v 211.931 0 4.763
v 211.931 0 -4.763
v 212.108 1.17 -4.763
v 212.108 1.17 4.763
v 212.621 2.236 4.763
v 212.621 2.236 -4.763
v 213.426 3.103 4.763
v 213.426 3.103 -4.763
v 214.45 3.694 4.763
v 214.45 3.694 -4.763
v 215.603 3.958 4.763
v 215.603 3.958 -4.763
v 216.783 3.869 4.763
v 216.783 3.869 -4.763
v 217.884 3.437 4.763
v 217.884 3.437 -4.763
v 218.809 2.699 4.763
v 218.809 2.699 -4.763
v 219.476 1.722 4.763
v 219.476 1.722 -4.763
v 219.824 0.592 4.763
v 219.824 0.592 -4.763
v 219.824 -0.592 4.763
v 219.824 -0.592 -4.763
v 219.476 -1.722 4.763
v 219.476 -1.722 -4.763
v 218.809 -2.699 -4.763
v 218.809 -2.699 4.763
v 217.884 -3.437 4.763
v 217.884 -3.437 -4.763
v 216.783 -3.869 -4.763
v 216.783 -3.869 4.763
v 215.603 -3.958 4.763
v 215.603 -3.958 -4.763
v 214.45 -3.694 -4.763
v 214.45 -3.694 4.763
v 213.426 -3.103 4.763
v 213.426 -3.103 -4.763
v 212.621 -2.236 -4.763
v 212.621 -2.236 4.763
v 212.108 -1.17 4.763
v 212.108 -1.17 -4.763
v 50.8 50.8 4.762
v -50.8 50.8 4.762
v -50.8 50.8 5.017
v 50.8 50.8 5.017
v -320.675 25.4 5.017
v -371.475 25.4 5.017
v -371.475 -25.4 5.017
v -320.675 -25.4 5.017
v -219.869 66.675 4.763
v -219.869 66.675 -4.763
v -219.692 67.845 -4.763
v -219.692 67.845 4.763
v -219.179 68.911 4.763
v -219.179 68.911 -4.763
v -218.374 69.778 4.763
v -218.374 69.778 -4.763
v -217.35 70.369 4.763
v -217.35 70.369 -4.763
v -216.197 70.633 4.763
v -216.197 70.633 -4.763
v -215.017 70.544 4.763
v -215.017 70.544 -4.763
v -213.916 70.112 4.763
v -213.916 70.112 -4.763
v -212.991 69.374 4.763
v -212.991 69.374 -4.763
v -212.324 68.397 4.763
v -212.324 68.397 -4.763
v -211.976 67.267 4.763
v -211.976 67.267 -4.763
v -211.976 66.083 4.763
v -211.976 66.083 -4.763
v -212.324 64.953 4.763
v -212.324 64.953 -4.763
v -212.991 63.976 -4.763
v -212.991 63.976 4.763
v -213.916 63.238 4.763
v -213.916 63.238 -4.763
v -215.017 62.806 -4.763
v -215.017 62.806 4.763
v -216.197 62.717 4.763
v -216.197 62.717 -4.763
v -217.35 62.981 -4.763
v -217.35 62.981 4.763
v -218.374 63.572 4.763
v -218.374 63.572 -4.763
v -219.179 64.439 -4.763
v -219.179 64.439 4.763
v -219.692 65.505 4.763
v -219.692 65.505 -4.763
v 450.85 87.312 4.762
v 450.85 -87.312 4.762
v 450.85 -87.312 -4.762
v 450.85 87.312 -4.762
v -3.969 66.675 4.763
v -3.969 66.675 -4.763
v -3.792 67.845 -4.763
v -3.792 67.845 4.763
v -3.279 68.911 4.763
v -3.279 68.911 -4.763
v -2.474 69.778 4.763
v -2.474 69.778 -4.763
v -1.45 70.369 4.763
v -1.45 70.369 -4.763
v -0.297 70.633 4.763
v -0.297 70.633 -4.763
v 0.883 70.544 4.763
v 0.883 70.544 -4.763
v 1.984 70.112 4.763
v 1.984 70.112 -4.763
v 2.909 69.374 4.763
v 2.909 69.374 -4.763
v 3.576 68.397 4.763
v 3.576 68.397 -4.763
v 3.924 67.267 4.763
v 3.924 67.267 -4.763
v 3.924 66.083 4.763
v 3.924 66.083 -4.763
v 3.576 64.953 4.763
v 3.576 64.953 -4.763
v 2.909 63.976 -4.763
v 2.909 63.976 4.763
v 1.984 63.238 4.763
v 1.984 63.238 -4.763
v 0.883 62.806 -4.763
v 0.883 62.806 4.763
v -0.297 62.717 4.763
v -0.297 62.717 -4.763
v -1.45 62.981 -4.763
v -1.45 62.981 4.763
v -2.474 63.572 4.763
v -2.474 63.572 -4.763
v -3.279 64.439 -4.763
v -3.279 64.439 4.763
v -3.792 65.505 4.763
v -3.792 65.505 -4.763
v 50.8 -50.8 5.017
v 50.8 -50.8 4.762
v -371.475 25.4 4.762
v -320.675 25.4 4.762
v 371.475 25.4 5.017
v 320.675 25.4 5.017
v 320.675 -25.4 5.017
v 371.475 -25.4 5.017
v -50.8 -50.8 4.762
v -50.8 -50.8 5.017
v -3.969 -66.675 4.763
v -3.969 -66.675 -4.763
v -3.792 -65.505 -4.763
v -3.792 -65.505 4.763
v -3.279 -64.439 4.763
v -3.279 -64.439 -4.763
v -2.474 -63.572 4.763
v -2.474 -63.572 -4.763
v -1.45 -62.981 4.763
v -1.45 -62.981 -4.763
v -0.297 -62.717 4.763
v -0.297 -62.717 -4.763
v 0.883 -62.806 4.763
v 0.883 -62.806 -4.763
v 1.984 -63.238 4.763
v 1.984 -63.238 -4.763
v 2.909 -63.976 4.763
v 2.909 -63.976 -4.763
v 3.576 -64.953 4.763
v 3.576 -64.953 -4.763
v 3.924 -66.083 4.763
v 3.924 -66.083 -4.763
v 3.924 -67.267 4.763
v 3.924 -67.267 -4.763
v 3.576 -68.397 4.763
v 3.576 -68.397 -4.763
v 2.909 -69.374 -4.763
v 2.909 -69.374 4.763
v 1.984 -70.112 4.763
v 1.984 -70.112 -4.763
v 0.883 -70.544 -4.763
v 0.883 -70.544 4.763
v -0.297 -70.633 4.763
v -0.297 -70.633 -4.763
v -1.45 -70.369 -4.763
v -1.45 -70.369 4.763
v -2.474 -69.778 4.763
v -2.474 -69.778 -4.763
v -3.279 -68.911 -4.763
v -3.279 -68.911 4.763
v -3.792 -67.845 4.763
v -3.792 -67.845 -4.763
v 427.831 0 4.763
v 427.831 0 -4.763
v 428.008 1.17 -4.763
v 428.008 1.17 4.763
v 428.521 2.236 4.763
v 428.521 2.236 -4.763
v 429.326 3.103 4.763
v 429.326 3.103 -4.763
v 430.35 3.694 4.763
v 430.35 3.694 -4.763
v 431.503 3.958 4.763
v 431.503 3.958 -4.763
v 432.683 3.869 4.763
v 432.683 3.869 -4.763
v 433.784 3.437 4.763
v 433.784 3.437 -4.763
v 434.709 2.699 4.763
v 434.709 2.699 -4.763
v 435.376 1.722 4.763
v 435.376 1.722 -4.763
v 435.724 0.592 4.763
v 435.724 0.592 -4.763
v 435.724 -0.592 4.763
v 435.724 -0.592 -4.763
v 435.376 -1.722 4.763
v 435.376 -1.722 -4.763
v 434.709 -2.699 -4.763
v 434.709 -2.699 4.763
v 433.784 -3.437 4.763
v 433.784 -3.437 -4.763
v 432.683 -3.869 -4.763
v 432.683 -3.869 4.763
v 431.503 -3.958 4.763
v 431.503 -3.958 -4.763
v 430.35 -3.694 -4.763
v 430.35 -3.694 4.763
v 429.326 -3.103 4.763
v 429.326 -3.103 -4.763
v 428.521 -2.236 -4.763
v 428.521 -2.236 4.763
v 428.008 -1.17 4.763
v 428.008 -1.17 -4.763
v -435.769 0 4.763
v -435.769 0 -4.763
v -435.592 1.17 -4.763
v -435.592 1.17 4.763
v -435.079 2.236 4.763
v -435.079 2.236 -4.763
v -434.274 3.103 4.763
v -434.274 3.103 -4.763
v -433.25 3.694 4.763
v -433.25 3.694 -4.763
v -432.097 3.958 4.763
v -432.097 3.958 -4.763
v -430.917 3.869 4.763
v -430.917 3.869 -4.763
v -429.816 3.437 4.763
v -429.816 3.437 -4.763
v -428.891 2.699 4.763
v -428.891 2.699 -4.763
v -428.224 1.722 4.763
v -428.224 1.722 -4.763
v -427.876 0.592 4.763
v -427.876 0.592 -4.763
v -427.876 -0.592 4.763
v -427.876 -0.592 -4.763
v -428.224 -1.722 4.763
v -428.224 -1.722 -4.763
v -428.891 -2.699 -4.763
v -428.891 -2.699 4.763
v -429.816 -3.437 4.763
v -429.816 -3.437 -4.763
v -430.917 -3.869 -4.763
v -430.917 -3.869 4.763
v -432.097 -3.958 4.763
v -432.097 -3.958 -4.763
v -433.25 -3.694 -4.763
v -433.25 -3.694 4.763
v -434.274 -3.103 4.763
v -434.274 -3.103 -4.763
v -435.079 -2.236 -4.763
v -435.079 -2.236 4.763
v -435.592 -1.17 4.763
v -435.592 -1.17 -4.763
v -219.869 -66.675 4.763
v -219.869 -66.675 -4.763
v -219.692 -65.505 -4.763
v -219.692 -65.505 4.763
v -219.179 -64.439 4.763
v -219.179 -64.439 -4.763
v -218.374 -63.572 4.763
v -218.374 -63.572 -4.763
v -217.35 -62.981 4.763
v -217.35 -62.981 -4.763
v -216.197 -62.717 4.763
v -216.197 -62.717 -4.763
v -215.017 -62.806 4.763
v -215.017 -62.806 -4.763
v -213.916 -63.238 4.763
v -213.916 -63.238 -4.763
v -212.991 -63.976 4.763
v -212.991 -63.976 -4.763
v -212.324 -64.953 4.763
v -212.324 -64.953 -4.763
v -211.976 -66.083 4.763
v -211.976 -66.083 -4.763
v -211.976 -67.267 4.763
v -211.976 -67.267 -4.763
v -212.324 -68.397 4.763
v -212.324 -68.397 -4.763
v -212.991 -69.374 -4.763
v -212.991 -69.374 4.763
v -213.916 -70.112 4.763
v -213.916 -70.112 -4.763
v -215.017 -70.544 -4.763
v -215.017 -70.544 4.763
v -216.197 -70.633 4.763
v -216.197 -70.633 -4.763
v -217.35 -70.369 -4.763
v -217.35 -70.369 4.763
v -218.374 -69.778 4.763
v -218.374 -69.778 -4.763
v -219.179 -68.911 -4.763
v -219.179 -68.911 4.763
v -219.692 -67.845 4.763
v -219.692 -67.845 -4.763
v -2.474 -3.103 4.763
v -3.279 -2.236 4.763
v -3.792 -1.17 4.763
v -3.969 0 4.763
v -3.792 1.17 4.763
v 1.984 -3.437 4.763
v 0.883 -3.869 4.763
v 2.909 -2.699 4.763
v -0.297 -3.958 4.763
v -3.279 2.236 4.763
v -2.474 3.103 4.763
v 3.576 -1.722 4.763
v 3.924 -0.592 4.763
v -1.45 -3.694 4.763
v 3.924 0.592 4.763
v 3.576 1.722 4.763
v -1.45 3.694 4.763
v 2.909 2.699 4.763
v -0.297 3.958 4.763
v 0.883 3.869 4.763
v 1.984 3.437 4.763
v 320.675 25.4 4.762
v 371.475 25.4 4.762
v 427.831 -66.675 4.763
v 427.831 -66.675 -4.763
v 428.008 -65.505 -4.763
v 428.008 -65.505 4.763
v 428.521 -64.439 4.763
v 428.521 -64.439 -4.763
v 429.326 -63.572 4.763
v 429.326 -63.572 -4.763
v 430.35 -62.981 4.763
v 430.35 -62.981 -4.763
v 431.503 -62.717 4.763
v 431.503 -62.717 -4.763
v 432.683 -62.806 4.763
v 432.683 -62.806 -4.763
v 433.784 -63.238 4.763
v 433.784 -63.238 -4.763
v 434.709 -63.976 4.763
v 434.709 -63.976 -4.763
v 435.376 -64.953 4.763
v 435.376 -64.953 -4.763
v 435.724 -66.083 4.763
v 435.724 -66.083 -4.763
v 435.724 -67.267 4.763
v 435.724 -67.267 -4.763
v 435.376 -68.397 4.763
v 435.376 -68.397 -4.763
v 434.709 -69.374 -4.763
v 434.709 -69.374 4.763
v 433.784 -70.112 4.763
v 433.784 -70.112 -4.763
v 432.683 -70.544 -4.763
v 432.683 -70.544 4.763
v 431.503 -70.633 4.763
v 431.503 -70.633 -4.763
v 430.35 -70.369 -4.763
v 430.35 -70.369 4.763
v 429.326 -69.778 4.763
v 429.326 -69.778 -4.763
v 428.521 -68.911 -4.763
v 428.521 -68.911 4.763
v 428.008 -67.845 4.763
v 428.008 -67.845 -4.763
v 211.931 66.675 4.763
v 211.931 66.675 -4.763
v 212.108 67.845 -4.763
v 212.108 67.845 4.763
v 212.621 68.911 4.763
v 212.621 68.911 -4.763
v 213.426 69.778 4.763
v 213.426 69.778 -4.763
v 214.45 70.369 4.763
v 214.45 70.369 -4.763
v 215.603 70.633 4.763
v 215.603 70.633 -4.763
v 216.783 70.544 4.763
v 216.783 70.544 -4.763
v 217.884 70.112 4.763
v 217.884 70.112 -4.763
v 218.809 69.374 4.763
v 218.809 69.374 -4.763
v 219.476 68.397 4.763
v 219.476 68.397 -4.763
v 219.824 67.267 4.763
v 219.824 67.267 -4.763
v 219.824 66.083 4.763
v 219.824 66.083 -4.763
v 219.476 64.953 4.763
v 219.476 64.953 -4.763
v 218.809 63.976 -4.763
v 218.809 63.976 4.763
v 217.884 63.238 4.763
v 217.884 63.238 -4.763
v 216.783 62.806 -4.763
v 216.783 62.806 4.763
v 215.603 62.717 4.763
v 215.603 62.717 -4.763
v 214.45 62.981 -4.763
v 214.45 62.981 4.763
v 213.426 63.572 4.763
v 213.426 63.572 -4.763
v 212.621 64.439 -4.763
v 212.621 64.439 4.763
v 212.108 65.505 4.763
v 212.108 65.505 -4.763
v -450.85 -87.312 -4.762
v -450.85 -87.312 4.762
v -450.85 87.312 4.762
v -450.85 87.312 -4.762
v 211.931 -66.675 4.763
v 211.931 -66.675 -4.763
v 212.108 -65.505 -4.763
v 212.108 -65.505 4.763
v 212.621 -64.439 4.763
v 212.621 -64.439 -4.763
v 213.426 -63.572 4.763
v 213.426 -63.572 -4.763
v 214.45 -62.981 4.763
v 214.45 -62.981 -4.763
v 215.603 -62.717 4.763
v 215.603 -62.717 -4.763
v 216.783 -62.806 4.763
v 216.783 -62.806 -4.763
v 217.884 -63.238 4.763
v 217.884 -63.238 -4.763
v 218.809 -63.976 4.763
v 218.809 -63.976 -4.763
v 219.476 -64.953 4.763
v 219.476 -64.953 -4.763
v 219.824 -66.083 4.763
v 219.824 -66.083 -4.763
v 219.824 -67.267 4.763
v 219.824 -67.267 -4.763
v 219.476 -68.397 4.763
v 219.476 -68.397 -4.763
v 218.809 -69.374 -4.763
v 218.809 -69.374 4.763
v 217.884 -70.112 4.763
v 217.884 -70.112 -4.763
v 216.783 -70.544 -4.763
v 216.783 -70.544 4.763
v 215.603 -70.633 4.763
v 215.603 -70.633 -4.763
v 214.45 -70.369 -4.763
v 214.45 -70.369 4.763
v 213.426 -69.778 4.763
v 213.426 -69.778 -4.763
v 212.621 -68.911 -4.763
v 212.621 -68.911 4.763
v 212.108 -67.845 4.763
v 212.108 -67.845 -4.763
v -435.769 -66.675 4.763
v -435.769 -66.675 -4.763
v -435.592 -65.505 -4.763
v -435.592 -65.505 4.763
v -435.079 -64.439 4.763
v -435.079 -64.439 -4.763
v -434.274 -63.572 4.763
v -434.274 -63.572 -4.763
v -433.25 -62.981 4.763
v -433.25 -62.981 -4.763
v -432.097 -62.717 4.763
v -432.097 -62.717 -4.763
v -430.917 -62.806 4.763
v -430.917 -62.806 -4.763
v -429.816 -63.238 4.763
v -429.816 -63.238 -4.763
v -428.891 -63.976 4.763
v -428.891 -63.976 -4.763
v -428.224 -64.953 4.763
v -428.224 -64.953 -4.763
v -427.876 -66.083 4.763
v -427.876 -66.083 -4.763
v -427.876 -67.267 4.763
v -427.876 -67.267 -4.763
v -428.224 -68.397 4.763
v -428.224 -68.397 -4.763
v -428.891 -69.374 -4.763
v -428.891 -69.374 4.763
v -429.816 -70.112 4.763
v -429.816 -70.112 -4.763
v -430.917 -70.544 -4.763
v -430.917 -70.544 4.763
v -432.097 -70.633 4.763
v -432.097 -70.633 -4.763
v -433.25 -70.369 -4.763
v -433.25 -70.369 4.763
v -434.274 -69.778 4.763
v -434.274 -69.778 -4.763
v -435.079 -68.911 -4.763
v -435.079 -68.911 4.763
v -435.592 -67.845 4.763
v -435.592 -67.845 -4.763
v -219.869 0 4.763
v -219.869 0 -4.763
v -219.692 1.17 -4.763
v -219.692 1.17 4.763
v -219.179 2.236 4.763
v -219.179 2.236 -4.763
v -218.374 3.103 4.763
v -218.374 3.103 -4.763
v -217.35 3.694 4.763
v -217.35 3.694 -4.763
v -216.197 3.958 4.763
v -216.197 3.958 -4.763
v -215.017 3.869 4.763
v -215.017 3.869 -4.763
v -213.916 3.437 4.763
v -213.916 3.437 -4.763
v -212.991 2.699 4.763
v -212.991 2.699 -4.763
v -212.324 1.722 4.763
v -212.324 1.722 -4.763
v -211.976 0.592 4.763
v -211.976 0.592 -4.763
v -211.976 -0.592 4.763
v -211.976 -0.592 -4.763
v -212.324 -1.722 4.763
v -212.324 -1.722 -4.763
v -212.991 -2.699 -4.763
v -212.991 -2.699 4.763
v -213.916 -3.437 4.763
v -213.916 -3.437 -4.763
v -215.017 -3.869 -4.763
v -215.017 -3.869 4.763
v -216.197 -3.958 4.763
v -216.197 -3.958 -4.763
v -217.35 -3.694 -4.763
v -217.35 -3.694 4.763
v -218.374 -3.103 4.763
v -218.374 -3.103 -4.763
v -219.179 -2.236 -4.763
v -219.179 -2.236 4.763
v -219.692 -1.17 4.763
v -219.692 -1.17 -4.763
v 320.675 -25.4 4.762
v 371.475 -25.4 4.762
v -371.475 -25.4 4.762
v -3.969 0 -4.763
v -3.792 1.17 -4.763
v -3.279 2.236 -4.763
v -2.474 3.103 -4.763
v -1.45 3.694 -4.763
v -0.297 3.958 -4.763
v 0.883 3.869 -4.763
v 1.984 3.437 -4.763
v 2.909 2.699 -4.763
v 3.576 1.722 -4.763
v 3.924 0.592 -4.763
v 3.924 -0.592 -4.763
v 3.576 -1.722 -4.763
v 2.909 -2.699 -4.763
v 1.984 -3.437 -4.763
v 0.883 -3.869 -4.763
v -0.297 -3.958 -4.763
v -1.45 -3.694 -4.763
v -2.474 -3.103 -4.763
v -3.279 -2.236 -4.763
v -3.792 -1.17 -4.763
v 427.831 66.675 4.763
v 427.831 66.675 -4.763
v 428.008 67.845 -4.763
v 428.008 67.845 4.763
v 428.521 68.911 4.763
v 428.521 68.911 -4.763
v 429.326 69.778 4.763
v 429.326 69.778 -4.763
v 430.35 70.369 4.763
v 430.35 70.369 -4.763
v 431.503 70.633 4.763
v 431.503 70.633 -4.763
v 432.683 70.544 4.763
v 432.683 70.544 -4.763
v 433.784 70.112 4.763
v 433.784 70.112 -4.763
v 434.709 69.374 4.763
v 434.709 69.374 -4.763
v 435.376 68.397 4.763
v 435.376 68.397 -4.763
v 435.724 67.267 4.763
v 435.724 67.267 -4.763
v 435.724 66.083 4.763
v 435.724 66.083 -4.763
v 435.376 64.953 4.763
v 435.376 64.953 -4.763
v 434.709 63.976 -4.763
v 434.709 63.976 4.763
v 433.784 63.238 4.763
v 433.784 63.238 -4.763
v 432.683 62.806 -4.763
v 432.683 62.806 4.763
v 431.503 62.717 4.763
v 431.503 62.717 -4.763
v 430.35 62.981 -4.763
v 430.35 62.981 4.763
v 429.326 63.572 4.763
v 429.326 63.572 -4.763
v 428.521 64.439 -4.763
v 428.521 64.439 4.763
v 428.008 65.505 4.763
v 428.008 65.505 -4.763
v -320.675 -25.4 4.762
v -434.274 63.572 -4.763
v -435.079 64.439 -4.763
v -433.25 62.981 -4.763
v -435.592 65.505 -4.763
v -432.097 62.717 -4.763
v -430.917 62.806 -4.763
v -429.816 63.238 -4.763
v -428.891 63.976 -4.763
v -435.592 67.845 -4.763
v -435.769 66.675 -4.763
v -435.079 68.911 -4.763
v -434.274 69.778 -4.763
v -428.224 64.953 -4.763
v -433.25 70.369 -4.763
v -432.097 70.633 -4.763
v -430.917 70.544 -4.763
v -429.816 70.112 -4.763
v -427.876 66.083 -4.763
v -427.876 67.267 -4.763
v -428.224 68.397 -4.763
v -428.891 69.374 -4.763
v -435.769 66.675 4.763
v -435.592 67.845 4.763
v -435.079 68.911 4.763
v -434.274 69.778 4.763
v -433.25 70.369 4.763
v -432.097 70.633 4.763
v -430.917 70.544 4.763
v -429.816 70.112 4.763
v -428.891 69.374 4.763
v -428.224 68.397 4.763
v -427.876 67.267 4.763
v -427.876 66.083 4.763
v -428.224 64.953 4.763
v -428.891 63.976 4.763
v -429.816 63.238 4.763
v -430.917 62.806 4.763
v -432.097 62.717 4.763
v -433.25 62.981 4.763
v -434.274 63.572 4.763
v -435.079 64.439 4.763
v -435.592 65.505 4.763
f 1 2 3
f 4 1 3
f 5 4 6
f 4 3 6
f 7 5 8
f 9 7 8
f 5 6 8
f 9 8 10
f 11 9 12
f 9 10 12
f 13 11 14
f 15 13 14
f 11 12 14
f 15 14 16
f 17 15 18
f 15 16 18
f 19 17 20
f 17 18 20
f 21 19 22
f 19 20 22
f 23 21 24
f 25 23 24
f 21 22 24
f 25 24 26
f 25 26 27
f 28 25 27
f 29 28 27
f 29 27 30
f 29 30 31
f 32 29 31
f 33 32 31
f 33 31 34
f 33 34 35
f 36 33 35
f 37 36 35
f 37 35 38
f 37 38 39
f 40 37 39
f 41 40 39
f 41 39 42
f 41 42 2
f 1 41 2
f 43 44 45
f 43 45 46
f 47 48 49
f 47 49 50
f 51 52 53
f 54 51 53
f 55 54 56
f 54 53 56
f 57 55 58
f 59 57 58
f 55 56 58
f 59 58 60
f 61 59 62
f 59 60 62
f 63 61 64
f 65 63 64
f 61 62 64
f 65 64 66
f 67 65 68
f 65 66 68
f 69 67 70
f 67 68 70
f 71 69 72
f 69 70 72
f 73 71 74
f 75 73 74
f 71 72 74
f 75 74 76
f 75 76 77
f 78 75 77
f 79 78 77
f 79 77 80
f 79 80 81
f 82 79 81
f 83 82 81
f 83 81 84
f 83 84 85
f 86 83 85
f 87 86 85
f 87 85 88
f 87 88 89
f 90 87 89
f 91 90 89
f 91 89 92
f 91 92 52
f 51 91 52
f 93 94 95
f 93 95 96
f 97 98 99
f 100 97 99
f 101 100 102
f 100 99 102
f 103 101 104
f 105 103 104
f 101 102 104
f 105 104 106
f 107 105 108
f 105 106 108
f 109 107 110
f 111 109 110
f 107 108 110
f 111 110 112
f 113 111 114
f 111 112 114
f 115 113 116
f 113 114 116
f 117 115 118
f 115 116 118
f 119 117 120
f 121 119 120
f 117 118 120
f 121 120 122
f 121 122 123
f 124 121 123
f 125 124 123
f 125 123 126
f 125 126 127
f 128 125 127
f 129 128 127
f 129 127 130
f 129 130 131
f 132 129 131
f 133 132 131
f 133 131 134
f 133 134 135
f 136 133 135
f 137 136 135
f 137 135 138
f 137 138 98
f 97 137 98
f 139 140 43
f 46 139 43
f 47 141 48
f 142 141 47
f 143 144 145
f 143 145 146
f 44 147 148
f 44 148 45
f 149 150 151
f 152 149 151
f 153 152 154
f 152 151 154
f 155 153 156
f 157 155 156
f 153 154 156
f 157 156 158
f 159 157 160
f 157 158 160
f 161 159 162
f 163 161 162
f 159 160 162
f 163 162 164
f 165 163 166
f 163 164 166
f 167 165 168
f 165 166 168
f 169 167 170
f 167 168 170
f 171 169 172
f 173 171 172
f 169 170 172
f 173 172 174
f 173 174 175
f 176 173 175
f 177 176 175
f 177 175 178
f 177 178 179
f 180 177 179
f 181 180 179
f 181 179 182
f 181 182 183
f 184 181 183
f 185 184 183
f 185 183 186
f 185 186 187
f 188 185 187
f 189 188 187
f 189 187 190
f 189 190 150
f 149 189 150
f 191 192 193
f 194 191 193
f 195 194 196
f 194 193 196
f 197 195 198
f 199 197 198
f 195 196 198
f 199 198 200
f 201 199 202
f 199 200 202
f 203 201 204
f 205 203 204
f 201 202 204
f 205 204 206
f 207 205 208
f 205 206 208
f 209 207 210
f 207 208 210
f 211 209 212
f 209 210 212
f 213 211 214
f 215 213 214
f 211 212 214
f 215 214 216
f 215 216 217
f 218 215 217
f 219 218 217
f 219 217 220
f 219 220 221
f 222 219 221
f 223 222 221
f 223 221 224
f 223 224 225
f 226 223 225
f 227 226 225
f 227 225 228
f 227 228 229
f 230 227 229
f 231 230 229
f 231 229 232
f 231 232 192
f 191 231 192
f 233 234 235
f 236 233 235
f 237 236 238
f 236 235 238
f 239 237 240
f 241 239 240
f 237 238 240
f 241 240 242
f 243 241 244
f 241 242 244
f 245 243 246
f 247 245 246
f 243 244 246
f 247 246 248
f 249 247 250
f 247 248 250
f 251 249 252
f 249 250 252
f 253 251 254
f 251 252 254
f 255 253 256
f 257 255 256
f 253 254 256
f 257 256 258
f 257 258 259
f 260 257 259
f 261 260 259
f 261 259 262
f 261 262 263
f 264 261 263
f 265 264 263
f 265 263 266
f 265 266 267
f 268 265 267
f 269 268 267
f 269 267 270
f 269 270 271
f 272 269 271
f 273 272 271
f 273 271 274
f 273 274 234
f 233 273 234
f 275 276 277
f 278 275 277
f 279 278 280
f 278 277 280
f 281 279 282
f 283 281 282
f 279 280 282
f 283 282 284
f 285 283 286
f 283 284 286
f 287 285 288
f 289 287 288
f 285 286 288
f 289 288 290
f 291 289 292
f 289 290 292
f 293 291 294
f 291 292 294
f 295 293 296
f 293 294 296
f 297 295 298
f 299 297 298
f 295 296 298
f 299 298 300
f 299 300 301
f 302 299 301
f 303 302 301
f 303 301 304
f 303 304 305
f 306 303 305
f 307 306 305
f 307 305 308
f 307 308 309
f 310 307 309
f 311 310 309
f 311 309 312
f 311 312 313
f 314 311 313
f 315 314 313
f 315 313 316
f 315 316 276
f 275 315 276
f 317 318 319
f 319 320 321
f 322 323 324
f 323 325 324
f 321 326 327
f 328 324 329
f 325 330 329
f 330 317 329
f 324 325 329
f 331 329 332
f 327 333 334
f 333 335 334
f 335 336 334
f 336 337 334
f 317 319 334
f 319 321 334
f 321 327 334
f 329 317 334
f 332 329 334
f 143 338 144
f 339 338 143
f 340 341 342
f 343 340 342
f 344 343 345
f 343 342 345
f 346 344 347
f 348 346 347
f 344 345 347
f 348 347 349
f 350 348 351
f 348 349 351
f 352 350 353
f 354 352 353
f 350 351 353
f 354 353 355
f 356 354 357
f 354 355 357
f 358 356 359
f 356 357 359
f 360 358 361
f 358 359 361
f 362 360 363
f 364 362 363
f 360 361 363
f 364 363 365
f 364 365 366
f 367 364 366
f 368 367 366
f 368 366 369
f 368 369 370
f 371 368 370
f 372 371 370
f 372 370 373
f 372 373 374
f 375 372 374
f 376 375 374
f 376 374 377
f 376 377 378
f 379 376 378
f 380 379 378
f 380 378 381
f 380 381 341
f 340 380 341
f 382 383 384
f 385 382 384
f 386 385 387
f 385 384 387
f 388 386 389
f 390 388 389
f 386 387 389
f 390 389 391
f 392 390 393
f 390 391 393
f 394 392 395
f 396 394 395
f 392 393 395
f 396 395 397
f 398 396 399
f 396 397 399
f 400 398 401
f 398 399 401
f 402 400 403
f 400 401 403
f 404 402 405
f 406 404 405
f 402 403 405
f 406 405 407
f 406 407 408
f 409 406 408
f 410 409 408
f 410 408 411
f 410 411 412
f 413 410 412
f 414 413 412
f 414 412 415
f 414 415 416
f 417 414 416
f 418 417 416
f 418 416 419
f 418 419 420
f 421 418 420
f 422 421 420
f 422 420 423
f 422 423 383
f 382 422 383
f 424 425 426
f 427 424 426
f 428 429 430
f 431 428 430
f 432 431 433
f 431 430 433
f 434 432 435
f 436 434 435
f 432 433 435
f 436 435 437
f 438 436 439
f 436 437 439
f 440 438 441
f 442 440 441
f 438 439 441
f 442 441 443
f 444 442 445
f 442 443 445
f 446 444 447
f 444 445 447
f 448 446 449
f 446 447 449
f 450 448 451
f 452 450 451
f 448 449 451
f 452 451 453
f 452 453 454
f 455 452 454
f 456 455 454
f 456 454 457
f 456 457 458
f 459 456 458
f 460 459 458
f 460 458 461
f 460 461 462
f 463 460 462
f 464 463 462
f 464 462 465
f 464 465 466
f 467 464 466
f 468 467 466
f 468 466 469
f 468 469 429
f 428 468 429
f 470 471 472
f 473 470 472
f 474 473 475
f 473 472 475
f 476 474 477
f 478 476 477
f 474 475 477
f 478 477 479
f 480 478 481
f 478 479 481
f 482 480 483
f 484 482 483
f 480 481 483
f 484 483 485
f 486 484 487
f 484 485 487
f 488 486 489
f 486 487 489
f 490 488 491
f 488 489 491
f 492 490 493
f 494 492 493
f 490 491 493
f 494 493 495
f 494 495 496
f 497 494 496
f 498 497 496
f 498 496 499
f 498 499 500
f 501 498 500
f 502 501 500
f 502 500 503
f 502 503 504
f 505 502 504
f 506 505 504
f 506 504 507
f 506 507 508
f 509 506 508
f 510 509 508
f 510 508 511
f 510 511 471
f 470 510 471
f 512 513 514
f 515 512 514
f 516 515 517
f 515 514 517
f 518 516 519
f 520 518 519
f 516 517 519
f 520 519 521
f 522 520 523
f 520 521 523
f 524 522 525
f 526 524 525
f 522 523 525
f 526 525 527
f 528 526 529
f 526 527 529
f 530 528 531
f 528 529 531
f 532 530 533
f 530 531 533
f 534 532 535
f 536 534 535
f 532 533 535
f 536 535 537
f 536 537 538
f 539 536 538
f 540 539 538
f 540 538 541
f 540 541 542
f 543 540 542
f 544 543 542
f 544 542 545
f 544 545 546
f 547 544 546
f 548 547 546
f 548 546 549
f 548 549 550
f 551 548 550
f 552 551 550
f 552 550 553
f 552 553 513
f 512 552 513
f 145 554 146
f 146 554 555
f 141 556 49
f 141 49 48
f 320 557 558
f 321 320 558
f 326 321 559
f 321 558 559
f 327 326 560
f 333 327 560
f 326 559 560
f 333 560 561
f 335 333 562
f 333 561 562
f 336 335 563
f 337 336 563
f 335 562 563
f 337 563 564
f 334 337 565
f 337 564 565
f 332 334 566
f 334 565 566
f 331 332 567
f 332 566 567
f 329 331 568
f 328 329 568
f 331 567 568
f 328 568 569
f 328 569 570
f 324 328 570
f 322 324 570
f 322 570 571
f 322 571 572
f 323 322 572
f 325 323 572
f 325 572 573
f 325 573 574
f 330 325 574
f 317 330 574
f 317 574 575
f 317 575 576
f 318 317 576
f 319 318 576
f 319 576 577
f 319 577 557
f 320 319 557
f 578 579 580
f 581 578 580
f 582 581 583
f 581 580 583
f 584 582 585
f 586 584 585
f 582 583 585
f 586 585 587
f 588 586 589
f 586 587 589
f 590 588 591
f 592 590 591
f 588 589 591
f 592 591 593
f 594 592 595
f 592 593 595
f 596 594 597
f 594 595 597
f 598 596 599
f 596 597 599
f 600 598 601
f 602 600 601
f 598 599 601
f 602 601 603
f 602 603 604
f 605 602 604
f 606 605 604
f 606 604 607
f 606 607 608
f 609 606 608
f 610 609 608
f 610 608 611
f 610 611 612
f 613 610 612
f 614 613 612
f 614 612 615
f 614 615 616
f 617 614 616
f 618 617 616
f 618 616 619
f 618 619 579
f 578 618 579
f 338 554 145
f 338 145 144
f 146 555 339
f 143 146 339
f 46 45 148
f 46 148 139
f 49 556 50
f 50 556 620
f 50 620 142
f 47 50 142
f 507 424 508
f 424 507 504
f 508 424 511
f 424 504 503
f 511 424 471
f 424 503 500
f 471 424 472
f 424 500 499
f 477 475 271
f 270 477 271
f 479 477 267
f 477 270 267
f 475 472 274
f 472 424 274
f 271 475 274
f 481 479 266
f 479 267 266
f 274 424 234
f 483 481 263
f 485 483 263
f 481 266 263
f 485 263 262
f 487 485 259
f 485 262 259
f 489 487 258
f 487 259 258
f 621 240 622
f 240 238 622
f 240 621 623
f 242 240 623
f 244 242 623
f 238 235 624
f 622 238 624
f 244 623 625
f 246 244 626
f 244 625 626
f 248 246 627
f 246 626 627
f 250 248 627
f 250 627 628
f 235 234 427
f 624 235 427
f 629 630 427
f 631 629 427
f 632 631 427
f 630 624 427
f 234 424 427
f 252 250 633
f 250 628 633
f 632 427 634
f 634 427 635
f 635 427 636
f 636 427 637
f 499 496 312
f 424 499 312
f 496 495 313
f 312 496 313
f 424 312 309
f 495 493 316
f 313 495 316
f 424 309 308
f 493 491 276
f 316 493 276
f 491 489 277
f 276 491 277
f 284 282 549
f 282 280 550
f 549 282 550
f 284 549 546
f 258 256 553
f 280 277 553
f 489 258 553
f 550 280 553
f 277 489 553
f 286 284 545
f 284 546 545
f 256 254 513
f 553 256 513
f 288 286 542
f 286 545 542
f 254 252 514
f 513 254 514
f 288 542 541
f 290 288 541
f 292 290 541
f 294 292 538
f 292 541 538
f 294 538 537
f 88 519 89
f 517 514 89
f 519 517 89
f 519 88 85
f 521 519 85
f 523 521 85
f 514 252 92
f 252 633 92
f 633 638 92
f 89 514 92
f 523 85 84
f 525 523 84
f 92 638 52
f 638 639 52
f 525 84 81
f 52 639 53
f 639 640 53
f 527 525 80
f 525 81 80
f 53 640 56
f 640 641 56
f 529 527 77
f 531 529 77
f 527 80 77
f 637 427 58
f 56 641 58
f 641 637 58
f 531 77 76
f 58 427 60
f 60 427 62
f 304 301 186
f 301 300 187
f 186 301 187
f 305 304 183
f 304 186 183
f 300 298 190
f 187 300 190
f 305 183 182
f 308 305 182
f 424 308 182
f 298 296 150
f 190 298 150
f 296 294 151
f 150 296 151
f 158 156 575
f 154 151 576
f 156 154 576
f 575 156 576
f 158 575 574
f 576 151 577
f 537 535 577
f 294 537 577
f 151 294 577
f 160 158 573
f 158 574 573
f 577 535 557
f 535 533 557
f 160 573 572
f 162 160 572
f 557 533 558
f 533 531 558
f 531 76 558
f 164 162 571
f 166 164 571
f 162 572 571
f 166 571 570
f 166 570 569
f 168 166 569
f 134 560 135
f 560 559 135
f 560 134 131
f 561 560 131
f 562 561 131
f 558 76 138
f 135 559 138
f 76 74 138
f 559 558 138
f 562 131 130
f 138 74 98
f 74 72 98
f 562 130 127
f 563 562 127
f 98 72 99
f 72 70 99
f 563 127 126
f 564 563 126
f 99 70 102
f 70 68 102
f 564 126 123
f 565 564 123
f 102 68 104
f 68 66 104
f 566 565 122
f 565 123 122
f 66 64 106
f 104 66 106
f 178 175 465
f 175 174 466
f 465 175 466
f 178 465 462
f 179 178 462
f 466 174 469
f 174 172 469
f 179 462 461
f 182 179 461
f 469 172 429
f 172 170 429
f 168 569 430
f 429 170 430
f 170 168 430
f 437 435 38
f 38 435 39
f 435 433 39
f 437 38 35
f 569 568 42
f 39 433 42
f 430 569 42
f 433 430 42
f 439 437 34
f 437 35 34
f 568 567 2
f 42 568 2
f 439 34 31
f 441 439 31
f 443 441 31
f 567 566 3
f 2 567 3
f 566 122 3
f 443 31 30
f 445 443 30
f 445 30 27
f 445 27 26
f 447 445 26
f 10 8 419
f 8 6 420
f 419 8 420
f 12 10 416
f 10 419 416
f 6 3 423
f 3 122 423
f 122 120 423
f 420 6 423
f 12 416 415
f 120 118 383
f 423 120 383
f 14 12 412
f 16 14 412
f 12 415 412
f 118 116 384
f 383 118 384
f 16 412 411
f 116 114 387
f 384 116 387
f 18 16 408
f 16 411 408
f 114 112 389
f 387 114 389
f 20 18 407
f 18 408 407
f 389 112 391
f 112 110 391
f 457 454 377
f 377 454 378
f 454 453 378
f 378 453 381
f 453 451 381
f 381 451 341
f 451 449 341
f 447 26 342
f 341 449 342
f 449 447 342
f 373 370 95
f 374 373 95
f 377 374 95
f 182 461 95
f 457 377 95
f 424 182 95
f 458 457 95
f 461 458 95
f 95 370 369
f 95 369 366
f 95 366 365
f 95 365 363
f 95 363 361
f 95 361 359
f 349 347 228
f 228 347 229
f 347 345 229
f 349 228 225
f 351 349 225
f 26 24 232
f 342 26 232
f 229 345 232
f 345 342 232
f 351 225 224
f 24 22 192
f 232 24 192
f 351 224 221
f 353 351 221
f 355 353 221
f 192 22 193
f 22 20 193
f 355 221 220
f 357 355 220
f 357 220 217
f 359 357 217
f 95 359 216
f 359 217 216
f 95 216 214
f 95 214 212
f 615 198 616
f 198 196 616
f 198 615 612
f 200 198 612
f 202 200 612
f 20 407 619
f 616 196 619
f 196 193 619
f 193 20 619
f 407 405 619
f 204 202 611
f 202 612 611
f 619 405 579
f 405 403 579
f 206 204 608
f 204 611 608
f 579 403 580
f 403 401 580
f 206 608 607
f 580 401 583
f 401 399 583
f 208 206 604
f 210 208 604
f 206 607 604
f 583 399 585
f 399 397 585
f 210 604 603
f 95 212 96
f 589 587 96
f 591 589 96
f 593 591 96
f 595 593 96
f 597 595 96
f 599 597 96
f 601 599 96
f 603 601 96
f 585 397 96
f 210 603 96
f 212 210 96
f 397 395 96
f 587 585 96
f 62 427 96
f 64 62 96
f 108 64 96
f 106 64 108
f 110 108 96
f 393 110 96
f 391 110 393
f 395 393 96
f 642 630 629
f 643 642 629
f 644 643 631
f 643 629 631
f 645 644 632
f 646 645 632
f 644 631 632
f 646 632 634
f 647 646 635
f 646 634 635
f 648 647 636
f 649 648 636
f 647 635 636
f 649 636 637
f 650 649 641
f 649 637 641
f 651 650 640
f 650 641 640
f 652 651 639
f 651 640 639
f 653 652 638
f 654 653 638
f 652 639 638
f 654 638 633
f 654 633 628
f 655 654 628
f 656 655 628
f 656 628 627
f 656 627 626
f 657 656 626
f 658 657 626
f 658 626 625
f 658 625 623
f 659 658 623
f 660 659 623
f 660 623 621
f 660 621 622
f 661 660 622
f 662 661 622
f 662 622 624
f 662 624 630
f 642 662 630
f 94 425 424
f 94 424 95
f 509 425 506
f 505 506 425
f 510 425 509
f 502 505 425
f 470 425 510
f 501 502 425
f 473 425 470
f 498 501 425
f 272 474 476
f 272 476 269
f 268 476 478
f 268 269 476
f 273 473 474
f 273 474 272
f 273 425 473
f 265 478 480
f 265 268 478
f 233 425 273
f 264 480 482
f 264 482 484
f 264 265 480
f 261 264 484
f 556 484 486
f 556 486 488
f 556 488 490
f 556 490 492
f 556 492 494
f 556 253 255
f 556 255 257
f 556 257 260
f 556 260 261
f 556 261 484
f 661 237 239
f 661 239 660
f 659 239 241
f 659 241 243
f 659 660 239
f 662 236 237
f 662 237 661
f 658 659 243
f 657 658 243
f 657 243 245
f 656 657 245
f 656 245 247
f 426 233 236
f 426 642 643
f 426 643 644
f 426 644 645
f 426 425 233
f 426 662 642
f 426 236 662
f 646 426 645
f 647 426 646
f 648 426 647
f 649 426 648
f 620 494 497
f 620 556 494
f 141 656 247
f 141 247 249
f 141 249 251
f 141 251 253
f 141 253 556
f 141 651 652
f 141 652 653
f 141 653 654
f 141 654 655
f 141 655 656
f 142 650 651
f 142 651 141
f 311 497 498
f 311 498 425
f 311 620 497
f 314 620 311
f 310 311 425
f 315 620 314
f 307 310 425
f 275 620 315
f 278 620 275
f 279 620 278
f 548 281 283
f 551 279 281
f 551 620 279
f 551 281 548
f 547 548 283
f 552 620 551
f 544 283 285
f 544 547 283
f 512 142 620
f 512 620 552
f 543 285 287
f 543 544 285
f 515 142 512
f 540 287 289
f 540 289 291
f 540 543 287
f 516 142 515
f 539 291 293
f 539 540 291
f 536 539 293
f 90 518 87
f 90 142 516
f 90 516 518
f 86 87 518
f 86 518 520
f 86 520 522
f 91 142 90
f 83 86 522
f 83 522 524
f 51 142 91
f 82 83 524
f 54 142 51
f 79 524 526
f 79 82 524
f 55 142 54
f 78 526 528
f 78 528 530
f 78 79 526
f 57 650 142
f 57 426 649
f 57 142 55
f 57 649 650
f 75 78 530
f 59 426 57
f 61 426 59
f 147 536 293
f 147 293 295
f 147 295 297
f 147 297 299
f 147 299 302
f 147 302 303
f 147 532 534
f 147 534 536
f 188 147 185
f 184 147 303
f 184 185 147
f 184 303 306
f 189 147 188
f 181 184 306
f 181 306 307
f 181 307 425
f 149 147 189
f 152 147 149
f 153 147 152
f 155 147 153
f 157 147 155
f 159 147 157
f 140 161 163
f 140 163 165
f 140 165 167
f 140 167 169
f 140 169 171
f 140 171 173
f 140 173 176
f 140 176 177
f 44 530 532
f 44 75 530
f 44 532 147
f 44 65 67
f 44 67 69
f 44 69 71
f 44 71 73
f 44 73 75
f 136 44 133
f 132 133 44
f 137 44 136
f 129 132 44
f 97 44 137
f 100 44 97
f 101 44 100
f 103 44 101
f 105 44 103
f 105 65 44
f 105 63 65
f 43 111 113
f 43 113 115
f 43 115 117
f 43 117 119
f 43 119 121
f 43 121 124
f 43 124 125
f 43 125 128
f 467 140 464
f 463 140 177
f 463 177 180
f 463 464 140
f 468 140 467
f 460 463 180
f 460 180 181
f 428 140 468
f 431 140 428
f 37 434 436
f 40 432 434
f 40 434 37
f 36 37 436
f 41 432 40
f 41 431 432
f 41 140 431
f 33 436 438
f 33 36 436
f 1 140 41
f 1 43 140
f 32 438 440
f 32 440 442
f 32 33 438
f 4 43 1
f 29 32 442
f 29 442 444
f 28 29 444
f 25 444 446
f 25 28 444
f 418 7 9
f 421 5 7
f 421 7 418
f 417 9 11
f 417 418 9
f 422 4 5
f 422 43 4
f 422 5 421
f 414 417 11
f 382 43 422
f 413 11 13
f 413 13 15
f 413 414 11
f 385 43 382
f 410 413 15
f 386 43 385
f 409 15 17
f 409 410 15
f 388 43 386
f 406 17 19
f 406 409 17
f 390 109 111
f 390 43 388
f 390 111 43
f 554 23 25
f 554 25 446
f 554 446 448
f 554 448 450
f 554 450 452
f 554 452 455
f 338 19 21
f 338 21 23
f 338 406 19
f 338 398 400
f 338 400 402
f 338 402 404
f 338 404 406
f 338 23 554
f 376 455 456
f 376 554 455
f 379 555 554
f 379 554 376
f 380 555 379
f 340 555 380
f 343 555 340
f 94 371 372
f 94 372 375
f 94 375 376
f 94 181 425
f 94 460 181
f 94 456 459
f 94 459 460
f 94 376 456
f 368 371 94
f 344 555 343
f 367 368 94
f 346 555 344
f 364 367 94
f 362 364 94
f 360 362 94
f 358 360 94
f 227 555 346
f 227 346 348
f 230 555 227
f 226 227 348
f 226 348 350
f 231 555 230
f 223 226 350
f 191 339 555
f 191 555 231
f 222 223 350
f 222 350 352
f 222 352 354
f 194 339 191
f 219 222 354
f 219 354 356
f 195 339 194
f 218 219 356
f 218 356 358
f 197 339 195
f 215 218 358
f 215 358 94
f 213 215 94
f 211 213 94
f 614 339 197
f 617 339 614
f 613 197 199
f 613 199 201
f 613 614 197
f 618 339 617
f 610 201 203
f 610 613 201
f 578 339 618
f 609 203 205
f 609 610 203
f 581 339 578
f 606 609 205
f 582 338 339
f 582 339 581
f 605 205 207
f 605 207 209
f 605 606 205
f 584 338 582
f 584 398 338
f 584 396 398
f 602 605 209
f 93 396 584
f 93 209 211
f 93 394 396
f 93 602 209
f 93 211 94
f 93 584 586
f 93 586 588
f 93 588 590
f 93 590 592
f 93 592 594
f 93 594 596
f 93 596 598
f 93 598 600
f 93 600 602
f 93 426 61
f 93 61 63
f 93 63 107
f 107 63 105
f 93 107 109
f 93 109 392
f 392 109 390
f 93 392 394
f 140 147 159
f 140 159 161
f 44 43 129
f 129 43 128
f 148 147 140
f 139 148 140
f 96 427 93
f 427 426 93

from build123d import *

# Parameters (mm, degrees)
F0_W     = 901.7
F0_H     = 174.625
F1_DEPTH = 4.7625
F3_D     = 7.9375
F4_W     = 101.6
F4_H     = 101.6
F4_W_2   = 50.8
F4_H_2   = 50.8
F5_DEPTH = 0.254


with BuildPart() as f1:
    # F0 (on Top) → F1 (new body, symmetric)
    with BuildSketch(Plane.XY):
        Rectangle(F0_W, F0_H)
    extrude(amount=F1_DEPTH, both=True)

    # F3 (through all)
    with Locations(Plane.XY.offset(4.7625)):
        with Locations((-215.9, 66.675), (-215.9, 0), (-215.9, -66.675), (-431.8, 66.675), (-431.8, 0), (-431.8, -66.675), (0, 66.675), (0, 0), (0, -66.675), (215.9, 66.675), (215.9, 0), (215.9, -66.675), (431.8, -66.675), (431.8, 0), (431.8, 66.675)):
            Hole(F3_D / 2)

    # F4 (on face) → F5 (join)
    with BuildSketch(Plane.XY.offset(4.7625)):
        Rectangle(F4_W, F4_H)
        with Locations((-346.075, 0)):
            Rectangle(F4_W_2, F4_H_2)
        with Locations((346.075, 0)):
            Rectangle(F4_W_2, F4_H_2)
    extrude(amount=F5_DEPTH)


solid = f1.part
